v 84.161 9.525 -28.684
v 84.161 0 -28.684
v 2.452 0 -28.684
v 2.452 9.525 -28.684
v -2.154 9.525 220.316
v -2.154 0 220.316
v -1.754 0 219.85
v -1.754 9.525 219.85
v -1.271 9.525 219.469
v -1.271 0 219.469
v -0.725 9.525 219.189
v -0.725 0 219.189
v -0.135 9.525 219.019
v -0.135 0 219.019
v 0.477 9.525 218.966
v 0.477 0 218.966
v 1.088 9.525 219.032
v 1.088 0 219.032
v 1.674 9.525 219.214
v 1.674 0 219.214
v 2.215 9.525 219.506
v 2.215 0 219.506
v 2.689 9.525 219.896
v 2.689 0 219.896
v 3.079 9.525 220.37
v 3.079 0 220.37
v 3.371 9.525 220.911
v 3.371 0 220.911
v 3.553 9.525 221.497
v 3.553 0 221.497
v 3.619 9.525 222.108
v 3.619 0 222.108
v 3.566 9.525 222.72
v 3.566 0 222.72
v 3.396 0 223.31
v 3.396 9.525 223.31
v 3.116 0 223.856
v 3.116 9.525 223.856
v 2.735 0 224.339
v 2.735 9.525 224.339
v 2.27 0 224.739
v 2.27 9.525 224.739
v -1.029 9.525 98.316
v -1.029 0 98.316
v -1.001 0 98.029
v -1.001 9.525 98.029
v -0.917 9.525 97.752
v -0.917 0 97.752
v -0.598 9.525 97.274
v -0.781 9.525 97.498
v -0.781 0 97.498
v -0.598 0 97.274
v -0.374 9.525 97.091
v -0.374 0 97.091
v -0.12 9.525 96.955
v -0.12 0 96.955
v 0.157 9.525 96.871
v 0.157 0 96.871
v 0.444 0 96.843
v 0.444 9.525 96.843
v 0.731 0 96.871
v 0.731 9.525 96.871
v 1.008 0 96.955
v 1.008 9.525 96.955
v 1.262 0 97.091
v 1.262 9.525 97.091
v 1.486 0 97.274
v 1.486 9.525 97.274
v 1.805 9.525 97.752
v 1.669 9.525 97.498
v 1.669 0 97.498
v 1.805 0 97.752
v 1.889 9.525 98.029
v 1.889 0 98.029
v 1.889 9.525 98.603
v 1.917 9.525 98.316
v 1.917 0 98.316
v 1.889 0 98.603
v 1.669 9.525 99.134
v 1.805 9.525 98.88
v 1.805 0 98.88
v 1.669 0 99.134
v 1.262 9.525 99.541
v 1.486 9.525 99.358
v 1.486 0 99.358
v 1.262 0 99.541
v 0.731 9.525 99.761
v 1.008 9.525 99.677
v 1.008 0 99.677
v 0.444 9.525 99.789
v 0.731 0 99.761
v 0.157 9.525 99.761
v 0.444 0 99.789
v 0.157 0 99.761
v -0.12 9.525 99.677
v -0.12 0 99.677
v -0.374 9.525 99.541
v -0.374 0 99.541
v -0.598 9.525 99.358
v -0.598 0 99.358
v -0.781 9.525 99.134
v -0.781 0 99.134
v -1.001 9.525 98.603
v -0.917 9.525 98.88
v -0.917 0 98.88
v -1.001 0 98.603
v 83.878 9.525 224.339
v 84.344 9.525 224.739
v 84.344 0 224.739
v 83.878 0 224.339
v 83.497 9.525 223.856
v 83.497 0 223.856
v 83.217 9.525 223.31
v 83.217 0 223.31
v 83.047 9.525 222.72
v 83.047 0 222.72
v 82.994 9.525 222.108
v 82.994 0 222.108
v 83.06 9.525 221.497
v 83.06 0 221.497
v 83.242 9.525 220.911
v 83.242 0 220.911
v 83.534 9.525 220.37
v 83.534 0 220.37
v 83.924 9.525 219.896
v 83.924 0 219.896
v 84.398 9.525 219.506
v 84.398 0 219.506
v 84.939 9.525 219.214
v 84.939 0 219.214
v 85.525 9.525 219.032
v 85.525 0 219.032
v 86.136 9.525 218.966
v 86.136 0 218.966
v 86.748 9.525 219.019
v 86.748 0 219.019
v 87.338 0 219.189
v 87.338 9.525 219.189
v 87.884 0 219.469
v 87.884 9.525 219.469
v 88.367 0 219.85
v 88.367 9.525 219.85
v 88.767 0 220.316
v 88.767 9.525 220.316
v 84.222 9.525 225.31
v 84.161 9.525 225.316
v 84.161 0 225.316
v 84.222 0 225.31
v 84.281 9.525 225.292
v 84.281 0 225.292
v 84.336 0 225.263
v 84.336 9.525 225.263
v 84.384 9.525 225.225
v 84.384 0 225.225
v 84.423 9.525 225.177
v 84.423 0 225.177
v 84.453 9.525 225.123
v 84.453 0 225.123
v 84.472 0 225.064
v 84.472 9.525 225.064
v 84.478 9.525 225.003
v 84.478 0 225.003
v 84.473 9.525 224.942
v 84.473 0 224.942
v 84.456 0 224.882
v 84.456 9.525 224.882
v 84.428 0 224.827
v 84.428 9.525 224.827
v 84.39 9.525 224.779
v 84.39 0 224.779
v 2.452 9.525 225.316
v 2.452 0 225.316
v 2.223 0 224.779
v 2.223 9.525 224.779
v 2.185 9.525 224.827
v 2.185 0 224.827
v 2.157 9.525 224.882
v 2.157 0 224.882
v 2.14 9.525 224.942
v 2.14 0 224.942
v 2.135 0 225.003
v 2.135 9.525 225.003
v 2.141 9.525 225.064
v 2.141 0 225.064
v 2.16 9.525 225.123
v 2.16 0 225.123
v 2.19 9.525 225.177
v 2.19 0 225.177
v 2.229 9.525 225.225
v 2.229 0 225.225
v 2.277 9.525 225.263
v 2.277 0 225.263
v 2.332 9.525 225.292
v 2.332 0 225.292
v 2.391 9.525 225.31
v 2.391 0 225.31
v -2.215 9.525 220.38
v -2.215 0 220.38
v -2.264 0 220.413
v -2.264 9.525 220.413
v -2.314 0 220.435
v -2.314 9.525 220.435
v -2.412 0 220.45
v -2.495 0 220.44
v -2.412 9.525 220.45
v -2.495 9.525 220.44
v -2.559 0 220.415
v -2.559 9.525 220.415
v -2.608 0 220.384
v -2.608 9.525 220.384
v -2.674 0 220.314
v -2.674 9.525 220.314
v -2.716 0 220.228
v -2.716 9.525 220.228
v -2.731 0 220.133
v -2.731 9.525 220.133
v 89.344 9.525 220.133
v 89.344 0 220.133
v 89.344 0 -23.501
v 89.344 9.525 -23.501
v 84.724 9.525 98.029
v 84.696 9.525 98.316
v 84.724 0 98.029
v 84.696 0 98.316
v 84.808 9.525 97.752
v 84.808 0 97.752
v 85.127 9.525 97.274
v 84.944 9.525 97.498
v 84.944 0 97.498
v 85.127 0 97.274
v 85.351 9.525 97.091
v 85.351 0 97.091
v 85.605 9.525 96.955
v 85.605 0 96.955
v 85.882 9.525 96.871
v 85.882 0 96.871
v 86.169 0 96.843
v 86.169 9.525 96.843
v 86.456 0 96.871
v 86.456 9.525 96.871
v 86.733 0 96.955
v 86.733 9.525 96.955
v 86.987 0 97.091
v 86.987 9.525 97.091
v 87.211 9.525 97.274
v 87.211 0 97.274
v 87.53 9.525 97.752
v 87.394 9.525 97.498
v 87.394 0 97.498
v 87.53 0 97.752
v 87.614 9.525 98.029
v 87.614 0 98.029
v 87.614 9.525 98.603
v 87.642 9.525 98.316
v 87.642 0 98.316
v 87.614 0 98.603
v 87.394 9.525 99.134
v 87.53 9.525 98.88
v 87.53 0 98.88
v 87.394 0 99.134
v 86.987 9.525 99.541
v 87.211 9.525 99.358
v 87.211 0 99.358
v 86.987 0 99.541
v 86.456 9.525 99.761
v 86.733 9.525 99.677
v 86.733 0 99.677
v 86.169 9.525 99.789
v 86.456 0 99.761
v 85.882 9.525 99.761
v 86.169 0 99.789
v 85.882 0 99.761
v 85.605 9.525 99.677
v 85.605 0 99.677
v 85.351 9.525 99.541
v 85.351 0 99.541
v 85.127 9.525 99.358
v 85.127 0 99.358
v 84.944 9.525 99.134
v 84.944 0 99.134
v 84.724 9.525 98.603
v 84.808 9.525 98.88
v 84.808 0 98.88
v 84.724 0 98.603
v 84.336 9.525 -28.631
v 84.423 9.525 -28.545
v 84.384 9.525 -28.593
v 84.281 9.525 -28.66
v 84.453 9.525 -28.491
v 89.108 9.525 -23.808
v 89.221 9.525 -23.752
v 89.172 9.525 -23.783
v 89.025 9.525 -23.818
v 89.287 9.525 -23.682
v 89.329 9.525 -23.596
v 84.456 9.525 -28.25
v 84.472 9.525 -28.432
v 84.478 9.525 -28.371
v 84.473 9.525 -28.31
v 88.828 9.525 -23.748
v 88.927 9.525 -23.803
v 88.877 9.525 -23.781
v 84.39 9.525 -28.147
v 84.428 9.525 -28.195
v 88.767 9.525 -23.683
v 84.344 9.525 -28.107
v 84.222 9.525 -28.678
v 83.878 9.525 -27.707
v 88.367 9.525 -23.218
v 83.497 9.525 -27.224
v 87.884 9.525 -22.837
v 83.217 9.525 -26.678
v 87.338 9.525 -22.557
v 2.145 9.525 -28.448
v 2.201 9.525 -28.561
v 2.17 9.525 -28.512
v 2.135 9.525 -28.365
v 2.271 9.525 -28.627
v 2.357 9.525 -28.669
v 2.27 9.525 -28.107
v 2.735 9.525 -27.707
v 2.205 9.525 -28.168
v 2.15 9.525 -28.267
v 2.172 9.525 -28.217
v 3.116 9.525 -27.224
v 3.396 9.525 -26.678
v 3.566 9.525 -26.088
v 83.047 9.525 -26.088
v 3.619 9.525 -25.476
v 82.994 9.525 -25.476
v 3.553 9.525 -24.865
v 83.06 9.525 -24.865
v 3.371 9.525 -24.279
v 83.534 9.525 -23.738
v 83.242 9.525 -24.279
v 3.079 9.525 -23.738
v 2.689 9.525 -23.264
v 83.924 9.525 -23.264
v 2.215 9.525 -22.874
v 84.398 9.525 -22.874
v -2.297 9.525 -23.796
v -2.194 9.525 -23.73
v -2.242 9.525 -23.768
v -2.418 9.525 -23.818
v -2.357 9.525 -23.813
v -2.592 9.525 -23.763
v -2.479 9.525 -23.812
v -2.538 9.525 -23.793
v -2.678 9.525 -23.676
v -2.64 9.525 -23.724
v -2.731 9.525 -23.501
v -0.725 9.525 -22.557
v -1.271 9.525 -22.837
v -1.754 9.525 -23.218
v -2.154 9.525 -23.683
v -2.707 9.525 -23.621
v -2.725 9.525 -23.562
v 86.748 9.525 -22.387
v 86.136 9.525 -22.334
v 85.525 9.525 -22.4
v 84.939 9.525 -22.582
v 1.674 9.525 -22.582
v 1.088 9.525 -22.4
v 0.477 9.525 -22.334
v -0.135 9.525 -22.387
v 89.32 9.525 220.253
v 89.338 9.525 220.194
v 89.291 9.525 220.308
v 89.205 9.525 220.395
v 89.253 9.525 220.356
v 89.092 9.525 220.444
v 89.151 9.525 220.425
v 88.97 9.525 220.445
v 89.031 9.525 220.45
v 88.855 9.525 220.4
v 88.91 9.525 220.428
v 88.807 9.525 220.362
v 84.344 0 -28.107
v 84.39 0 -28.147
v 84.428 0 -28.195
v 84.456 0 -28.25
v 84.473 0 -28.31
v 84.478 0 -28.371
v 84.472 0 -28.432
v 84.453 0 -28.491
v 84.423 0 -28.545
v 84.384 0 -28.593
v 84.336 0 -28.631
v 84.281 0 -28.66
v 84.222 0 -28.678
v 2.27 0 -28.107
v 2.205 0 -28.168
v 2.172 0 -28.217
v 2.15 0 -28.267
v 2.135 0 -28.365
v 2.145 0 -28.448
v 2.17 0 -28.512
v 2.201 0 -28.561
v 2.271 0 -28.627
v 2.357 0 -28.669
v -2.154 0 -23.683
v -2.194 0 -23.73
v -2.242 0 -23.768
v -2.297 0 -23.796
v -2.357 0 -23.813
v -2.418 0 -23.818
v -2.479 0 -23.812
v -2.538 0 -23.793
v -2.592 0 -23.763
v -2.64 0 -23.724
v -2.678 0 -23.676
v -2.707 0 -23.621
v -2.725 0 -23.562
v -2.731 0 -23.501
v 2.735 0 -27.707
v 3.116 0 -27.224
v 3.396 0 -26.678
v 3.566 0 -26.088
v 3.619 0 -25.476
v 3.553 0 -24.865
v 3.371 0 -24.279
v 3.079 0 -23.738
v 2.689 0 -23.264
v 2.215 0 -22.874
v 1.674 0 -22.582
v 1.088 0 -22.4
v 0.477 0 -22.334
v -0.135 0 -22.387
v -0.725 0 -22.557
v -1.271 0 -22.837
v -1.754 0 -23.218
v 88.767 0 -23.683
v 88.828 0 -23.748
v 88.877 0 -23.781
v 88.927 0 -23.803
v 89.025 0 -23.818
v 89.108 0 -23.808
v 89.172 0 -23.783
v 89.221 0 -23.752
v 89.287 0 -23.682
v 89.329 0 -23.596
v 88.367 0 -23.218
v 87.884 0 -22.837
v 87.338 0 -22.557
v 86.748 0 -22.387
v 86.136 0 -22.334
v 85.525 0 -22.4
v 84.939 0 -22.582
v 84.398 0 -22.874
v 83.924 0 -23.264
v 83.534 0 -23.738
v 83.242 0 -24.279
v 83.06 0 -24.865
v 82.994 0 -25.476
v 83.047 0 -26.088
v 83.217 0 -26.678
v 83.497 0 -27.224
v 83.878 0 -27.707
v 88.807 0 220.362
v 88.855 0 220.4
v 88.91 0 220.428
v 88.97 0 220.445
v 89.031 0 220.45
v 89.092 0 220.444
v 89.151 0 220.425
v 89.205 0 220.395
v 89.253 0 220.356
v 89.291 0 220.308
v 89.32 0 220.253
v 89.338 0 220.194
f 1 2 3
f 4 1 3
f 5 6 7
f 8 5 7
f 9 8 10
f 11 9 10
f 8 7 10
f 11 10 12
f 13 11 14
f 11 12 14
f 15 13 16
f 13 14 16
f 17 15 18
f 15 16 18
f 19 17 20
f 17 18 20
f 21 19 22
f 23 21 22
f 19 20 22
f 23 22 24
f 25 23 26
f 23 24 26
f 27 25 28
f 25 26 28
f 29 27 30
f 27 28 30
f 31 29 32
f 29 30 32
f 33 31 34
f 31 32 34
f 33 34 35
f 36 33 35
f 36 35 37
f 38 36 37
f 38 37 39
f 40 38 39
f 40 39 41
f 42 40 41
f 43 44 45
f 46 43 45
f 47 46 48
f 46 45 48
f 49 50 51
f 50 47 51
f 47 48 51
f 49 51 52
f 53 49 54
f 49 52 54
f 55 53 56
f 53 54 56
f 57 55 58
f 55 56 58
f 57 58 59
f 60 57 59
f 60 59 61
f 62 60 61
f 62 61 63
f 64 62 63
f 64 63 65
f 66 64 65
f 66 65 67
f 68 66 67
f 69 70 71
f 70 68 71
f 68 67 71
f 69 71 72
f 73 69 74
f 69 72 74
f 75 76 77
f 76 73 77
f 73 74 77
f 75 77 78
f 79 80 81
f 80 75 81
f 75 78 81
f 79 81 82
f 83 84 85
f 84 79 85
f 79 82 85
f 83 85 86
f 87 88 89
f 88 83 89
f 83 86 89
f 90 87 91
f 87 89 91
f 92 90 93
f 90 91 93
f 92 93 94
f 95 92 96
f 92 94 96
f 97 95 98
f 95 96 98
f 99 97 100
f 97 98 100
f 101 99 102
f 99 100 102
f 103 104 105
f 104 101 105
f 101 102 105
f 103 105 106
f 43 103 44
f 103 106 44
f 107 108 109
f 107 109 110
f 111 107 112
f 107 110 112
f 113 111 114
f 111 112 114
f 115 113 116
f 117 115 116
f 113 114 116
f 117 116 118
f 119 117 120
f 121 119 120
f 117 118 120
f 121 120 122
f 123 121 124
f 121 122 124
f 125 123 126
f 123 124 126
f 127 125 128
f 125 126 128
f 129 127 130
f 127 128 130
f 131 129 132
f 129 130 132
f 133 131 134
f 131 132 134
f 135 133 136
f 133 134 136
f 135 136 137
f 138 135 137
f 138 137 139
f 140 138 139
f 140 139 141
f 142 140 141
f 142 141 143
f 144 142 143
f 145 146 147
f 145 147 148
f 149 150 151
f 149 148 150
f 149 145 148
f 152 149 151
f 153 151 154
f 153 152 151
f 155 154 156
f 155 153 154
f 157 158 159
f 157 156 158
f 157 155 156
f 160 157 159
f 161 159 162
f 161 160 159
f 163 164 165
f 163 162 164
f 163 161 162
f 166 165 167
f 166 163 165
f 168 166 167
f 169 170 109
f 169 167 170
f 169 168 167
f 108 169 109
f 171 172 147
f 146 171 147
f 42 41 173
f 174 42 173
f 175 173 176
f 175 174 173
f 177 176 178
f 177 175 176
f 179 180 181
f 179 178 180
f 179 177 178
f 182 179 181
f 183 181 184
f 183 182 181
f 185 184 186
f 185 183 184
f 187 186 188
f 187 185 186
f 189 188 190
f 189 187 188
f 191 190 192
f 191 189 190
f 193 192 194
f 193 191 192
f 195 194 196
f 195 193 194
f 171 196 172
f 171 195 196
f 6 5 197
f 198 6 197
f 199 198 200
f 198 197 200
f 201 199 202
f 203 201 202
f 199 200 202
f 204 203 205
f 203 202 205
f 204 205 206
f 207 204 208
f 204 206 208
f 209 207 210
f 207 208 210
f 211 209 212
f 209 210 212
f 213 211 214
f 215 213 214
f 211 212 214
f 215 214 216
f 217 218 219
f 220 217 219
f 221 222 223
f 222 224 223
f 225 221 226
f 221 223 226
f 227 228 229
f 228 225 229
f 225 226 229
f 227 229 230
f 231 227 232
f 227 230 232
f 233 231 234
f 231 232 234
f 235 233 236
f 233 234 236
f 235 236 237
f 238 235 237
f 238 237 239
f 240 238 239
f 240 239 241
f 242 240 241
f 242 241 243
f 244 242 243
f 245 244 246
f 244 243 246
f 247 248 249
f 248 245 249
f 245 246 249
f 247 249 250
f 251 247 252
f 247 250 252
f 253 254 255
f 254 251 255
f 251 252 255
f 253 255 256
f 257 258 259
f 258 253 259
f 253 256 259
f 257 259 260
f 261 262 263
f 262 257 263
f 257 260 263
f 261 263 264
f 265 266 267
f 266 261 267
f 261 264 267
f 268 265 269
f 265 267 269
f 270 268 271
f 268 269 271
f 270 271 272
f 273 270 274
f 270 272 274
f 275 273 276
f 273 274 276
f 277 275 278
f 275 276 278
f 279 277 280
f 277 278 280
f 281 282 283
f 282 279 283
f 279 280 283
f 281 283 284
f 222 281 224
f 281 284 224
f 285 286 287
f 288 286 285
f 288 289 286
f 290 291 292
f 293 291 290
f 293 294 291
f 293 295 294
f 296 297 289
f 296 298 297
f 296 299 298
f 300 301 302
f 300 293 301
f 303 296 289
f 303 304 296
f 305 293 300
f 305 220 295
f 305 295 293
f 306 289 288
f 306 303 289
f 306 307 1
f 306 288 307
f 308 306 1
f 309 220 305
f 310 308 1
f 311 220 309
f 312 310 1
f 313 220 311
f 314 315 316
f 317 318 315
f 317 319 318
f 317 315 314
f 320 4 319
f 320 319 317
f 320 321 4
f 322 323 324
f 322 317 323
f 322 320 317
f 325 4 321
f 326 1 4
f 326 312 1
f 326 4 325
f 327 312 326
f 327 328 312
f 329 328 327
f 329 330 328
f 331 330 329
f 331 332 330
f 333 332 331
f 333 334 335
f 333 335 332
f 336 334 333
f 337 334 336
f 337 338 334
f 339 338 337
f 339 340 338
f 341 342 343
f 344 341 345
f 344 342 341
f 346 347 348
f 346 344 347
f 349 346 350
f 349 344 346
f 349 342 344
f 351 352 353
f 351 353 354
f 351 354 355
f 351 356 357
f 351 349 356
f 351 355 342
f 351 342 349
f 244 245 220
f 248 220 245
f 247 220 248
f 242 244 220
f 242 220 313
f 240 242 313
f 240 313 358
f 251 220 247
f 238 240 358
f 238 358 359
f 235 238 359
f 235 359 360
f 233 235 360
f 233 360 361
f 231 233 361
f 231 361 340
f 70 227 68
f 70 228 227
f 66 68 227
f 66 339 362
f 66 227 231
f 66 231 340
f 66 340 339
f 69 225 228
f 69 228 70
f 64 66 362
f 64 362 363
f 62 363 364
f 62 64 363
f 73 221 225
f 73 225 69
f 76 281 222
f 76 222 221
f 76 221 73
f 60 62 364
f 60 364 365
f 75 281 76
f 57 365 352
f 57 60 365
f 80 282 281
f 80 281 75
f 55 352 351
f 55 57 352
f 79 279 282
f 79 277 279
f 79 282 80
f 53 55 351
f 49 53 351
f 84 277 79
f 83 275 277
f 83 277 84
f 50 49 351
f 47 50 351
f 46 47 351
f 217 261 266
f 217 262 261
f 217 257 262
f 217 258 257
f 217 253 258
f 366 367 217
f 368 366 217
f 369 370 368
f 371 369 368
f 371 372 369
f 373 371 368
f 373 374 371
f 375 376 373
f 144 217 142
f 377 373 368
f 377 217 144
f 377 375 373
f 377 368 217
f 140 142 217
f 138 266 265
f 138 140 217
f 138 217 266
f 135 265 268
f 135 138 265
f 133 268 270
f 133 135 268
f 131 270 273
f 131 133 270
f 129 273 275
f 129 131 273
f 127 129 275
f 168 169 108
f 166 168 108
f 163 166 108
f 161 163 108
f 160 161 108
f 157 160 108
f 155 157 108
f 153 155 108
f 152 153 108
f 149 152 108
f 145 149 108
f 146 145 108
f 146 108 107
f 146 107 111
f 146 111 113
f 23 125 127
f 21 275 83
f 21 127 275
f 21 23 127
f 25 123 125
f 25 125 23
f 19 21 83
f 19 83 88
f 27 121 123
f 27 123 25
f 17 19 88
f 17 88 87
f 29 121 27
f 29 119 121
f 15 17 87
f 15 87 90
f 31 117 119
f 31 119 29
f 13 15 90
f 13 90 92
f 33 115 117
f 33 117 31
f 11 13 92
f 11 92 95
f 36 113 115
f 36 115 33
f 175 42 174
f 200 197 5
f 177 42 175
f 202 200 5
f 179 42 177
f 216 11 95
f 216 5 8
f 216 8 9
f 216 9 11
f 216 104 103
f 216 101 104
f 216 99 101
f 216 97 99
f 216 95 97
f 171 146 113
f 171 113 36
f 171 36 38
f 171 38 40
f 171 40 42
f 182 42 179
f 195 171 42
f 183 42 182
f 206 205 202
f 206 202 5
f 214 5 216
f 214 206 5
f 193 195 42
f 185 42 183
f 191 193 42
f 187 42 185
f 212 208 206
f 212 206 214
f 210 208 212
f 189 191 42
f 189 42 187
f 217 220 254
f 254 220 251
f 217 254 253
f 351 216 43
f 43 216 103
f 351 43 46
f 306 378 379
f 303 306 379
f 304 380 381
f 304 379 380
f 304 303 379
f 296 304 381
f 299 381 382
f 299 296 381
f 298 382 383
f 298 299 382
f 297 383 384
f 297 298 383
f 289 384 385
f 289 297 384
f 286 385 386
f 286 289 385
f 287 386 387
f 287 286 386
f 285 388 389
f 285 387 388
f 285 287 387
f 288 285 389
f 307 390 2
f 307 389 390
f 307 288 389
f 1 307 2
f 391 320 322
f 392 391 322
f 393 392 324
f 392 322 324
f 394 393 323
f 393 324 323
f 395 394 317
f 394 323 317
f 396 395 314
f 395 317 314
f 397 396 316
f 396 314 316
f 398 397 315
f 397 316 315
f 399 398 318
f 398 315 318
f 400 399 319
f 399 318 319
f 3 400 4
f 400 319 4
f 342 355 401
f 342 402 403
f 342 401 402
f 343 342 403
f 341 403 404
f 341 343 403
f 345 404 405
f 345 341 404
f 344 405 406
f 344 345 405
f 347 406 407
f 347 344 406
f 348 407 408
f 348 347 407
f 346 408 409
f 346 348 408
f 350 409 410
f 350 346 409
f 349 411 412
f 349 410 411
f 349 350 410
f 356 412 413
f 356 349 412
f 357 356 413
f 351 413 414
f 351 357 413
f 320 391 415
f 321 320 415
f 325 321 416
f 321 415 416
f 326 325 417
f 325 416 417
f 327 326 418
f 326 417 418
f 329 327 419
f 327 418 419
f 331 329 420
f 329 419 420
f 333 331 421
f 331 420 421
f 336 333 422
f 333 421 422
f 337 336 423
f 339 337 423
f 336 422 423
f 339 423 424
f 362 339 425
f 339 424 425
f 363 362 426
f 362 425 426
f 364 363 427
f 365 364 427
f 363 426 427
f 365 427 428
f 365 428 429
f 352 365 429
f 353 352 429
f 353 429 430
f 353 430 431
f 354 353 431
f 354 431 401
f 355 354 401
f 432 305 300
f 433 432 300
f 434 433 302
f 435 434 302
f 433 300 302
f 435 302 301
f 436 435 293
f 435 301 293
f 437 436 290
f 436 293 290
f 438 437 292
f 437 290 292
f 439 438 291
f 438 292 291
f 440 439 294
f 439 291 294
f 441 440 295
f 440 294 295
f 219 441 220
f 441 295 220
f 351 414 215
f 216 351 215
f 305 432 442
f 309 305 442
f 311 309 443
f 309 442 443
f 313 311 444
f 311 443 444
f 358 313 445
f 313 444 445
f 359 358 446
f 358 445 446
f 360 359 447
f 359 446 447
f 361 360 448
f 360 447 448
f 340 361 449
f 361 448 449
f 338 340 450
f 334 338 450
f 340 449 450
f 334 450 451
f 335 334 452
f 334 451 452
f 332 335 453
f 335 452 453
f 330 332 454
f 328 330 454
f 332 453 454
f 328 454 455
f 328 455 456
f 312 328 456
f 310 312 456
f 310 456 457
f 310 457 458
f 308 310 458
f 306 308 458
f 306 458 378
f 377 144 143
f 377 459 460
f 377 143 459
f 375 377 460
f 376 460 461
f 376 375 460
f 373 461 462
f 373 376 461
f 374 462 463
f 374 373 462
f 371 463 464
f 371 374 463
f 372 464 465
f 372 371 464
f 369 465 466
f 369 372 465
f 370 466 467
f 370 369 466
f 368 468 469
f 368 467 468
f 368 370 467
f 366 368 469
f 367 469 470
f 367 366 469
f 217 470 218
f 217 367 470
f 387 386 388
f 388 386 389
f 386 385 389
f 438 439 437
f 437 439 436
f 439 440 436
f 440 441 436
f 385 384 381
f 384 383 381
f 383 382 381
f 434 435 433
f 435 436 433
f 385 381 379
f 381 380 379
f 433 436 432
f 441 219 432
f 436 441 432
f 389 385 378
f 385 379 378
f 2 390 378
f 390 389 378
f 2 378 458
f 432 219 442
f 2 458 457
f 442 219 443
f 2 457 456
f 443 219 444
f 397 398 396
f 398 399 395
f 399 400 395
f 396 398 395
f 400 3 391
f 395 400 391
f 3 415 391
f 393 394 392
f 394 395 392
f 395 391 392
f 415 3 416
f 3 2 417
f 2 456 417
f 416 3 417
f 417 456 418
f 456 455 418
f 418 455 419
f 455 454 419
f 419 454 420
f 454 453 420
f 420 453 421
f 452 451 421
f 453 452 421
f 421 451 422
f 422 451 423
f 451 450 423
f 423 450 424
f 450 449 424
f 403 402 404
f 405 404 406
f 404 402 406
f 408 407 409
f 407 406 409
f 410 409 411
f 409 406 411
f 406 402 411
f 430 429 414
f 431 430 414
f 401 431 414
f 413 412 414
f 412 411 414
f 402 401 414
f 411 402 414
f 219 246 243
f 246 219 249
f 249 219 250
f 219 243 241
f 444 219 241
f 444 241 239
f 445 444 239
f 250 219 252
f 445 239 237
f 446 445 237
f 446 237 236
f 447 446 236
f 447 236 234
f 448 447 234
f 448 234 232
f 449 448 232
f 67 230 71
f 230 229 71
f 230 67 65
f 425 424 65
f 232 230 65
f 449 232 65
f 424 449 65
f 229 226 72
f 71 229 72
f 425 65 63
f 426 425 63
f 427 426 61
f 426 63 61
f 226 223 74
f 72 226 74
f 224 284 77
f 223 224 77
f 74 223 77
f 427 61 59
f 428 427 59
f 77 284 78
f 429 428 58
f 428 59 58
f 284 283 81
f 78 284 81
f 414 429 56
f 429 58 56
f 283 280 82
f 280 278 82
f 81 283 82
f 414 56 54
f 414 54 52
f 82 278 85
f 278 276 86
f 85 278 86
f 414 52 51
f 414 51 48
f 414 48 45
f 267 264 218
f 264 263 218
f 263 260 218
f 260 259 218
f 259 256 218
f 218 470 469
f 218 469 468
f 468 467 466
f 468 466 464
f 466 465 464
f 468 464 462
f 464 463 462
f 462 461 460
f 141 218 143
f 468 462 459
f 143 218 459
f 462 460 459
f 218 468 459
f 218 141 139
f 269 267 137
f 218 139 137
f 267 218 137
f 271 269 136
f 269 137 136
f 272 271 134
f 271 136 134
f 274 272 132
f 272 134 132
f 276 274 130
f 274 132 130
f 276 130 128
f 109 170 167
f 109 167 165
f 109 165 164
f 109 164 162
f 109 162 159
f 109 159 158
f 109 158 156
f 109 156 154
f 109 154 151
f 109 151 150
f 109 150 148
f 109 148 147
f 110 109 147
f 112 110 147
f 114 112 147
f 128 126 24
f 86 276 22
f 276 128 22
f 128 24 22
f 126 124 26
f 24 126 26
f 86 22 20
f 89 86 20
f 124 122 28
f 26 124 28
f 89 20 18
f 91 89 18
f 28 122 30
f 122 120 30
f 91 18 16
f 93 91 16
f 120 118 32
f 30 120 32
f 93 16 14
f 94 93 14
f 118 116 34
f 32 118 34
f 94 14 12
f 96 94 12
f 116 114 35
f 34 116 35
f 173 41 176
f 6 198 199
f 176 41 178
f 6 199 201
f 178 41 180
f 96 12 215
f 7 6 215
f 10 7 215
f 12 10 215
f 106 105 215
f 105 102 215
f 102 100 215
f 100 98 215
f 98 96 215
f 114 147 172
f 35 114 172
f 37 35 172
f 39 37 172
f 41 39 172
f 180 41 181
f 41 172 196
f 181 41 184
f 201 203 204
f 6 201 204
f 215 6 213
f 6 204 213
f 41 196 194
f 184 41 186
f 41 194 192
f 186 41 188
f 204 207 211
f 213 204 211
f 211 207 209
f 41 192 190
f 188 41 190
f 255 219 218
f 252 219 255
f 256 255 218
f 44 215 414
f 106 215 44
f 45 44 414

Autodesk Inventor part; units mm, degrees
ref_plane "YZ Plane" through (0, 0, 0) normal (1, 0, 0) x (0, 1, 0)
ref_plane "XZ Plane" through (0, 0, 0) normal (0, 1, 0) x (-1, 0, 0)
ref_plane "XY Plane" through (0, 0, 0) normal (0, 0, 1) x (1, 0, 0)
sketch "Sketch1" plane through (0, 0, 0) normal (0, 1, 0) x (-1, 0, 0)
  line L0 (-0.444009, 225.316004) -> (-86.169009, 225.316004)
  line L1 (-89.344009, 222.141004) -> (-89.344009, -25.508996)
  line L2 (-86.169009, -28.683996) -> (-0.444009, -28.683996)
  line L3 (2.730991, -25.508996) -> (2.730991, 222.141004)
  arc A0 (-86.169009, -28.683996) -> (-89.344009, -25.508996) centre (-86.169009, -25.508996) ccw
  arc A1 (-0.444009, 225.316004) -> (2.730991, 222.141004) centre (-0.444009, 222.141004) ccw
  arc A2 (-89.344009, 222.141004) -> (-86.169009, 225.316004) centre (-86.169009, 222.141004) ccw
  arc A3 (2.730991, -25.508996) -> (-0.444009, -28.683996) centre (-0.444009, -25.508996) ccw
  circle A4 centre (-0.444009, 98.316004) radius 1.4732
  circle A5 centre (-86.169009, 98.316004) radius 1.4732
  point P0 (0, 0)
  dimension "d2" = 6.35
  dimension "d3" = 6.35
  dimension "d4" = 6.35
  dimension "d5" = 6.35
  dimension "d7" = 2.9464
  dimension "d8" = 2.9464
sketch "Sketch1 outline for Extrusion1" plane through (0, 0, 0) normal (0, 1, 0) x (-1, 0, 0)
  arc A0 (2.730991, 222.141004) -> (-0.444009, 225.316004) centre (-0.444009, 222.141004) cw
  line L0 (2.730991, -25.508996) -> (2.730991, 222.141004)
  line L1 (-0.444009, 225.316004) -> (-86.169009, 225.316004)
  arc A1 (-0.444009, -28.683996) -> (2.730991, -25.508996) centre (-0.444009, -25.508996) cw
  arc A2 (-86.169009, 225.316004) -> (-89.344009, 222.141004) centre (-86.169009, 222.141004) cw
  line L2 (-86.169009, -28.683996) -> (-0.444009, -28.683996)
  line L3 (-89.344009, 222.141004) -> (-89.344009, -25.508996)
  arc A3 (-89.344009, -25.508996) -> (-86.169009, -28.683996) centre (-86.169009, -25.508996) cw
  circle A4 centre (-86.169009, 98.316004) radius 1.4732
  circle A5 centre (-0.444009, 98.316004) radius 1.4732
extrude "Extrusion1" add sketch "Sketch1 outline for Extrusion1" along normal blind 9.525
fillet "Fillet1" radius 0.3175 8 edges at (86.169, 4.7625, 225.316) (89.344, 4.7625, 222.141) (0.444, 4.7625, 225.316) (-2.731, 4.7625, 222.141) (-2.731, 4.7625, -25.509) (0.444, 4.7625, -28.684) (86.169, 4.7625, -28.684) (89.344, 4.7625, -25.509)
properties part number "Mid" material "Wood (Walnut)"
